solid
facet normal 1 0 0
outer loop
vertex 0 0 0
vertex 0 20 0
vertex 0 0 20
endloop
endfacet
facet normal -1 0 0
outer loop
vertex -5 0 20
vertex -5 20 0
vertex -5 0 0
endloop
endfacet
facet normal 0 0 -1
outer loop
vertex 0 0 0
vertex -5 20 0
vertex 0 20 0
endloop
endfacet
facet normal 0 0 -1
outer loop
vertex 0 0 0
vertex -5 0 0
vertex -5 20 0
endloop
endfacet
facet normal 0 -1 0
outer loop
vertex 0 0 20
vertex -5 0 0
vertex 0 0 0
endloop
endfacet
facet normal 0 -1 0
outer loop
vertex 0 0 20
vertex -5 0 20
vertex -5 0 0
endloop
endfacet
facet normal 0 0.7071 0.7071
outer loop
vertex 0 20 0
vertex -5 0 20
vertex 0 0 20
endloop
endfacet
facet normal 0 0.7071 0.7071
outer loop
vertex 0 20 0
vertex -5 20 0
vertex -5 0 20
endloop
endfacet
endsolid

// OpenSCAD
// file: ../robot_settings.scad
main_box_x = 100; // 96
main_box_y = 102;
main_box_z = 74; // 74.5

lfp_main_box_x = 65;
lfp_main_box_y = 151;
lfp_main_box_z = 95;

wall_thickness = 2;

rail_gap = 2;
rail_inset = 7;

rail_thickness = 7;
rail_length = 250;
rail_width = 250;

raspberry_pi_screw_seperation_y = 57;
raspberry_pi_screw_seperation_z = 48;
raspberry_pi_peg_h = 5;

battery_box_peg_h = 6;
battery_box_peg_d = 8;
battery_box_peg_cutout = 5;

gears_module = 1;
pinion_gear_teeth = 32;
pinion_gear_width = 5;
pinion_gear_bore = 8;

gears_setback_distance = 25;
gear_post_height = 2 * pinion_gear_width + rail_thickness + 8 ;

steering_motor_mount_x = 45;
steering_motor_mount_y = 36;
steering_motor_mount_z = 18;
steering_motor_mount_setback_distance = gears_setback_distance + 16;

dc_motor_drivertype = "Teyleten"; // Teyleten
isAdafruit = (dc_motor_drivertype == "Adafruit");

drv8871_x = isAdafruit ? 20.3 : 21.6;
drv8871_y = isAdafruit ?  24 : 25;

drv8871_z = 2;
drv8871_screw_d = 2.5;
drv8871_solder_points_z = 2;

drv8871mount_edge_x = 1.5;
drv8871mount_edge_wall = 3;
drv8871mount_z = 5;
drv8871mount_x = drv8871_x +  drv8871mount_edge_wall - 2* drv8871mount_edge_x;
drv8871mount_y = 19;

drv8871_screw_distance = 15.64;
drv8871_solder_points_d = 1.66;
drv8871_solder_offset_y = 4.4;
drv8871_solder_inner_points_distance = 5;
drv8871_solder_outer_points_distance = 12;

dc_motor_75_1_housing_minus_encoder_z = 53.8;
dc_motor_75_1_encoder_z = 14.75;
dc_motor_housing_minus_encoder_z = 48;
dc_motor_encoder_z = 9.33;
dc_motor_encoder_wheel_d = 13.4;
dc_motor_encoder_wheel_thickness = 5;
dc_motor_encoder_wheel_gap = 3;
dc_motor_encoder_circuit_thickness = 2;
dc_motor_cutout_d = 24.8;
dc_motor_cutout_z = 19.5;


M3_shaft_d = 2.82;

dc_motor_screw_head_z = 2;
dc_motor_screw_head_d = 5.6;
dc_motor_screw_d = 3.2;
dc_motor_screw_offset = 8.5;

dc_motor_axle_ring_z = 3;
dc_motor_axle_ring_d = 7.2;
dc_motor_axle_cutout_d = 4.2;
dc_motor_axle_cutout_z = 10;
dc_motor_axle_notch_cutout = 0.4;
dc_motor_axle_notch_cutout_z = 6;

pdmount_x = 20;
pdmount_y = 30;
pdmount_z = 2;
pdmount_edge_x = 1.5;
pdmount_edge_wall = 3;

steering_shaft_z = 45;
steering_shaft_d = 7;
steering_shaft_motor_fitting_d = 9;
coupler_length = 24.6;
coupler_diameter = 14;
coupler_screw_d = 4;
coupler_screw_z_offset = 5;
coupler_gear_side_insert = 12.6;
steering_shaft_with_coupler_z = steering_shaft_z - coupler_gear_side_insert;

lidar_mount_y = 110;
lidar_mount_x = 65 + 20;
lidar_narrow_screws = 40;
lidar_wide_screws = 56;
lidar_front_to_back_screws = 70;
lidar_screw_d = 3;
lidar_circuitboard_x = 20;
lidar_circuitboard_y = 35;
lidar_circuitboard_z = 1.2;
lidar_cord_length = 29;

ball_bearing_height = 7;
ball_bearing_outer_diameter = 22;
ball_bearing_inner_diameter = 8;

M4_diameter = 5.1;
M3_diameter = 2.9;
M3_length = 35;
M3_cap_length= 3;
M3_cap_diameter = 5.44;

suspension_spring_outer_diameter = 8;
suspension_spring_inner_diameter = 5.3;

armature_holder_height = 20;
armature_holder_thickness = 8;
pull_bar_peg_r = 3.2;
apparatus_locking_peg_d = 4;

rack_module = 1;
rack_length = main_box_x;
rack_height = 5;
rack_width = 10;
rack_teeth = 30;
rack_bore = 3;

pull_bar_length = rail_width / 2 - rack_length + 1;

// tire hardware
axle_length = 24 + ball_bearing_height; 
axle_reciever_inner_diameter = 8.2;
axle_reciever_outer_diameter = 12;
axle_reciever_length = 18.8;
axle_notch_length = 15;
axle_notch_cutout = 2.4;

// power distribution bar
power_bar_cutout_x = 96;
power_bar_y = 19.1;
power_bar_z = 1.5;
power_bar_screw_distance = 91.4;
power_bar_screw_d = 2.8;
power_bar_standoff_z = 5;
power_bar_standoff_d = 6.83;

pico_expander_width = 63;
pico_expander_height = 57;
pico_screw_hole_offset = 3;
pico_screw_hole_d = 2.5;

usbhub_thickness = 11.7;
usbhub_depth = 37.5;
usbhub_width = 86.7;
usbhub_end_port_width = 14.8;
usbhub_end_port_height = 12;
usbhub_front_face_safe_zone_left = 15;
usbhub_front_face_safe_zone_right = 14.8;

switch_w = 16;
switch_cutout_d = 12.2;
switch_bump_h = 2;
switch_bump_l = 18.2;

i2c_mount_thickness = 3;
i2c_w = 28;
i2c_l = 28;
i2c_circuitboard_thickness = 1.23;
i2c_bottom_notch_w = 14.35;
i2c_bottom_notch_depth = 1;
i2c_screw_hole_d = 1.9;
i2c_screw_hole_offset = 1.4;
i2c_pin_l = 11;
i2c_pin_d = 0.8;
i2c_pin_offset = 1.5;
i2c_pin_separation = 2.5;
i2c_all_pins_l = 8.3;
i2c_screen_thickness = 1.88;
i2c_screen_w = 14.6;
i2c_screen_d = 27;
i2c_screen_offset = 4.1;
// main file
include <../robot_settings.scad>

module support_angle(height = 20, width = 5, depth = 20)
{
    // ===============================
    // Parametric Pythagorean Triangle Cube
    // ===============================

    // Triangle legs
    a = height;   // length of first leg
    b = depth;   // length of second leg

    // Extrusion thickness (depth of the "cube")
    thickness = width;

    // Hypotenuse (computed automatically)
    c = sqrt(a*a + b*b);

    // 2D right triangle
    module right_triangle(a, b) {
        polygon(points=[
            [0,0],
            [a,0],
            [0,b]
        ]);
    }

    // 3D prism from the triangle
    module pythagorean_prism(a, b, thickness) {
        linear_extrude(height = thickness)
            right_triangle(a, b);
    }

    rotate([90, -90, -90])
    // Render the model
    pythagorean_prism(a, b, thickness);

    // Optional: print hypotenuse to console
   // echo("Hypotenuse =", c);

}
support_angle();
